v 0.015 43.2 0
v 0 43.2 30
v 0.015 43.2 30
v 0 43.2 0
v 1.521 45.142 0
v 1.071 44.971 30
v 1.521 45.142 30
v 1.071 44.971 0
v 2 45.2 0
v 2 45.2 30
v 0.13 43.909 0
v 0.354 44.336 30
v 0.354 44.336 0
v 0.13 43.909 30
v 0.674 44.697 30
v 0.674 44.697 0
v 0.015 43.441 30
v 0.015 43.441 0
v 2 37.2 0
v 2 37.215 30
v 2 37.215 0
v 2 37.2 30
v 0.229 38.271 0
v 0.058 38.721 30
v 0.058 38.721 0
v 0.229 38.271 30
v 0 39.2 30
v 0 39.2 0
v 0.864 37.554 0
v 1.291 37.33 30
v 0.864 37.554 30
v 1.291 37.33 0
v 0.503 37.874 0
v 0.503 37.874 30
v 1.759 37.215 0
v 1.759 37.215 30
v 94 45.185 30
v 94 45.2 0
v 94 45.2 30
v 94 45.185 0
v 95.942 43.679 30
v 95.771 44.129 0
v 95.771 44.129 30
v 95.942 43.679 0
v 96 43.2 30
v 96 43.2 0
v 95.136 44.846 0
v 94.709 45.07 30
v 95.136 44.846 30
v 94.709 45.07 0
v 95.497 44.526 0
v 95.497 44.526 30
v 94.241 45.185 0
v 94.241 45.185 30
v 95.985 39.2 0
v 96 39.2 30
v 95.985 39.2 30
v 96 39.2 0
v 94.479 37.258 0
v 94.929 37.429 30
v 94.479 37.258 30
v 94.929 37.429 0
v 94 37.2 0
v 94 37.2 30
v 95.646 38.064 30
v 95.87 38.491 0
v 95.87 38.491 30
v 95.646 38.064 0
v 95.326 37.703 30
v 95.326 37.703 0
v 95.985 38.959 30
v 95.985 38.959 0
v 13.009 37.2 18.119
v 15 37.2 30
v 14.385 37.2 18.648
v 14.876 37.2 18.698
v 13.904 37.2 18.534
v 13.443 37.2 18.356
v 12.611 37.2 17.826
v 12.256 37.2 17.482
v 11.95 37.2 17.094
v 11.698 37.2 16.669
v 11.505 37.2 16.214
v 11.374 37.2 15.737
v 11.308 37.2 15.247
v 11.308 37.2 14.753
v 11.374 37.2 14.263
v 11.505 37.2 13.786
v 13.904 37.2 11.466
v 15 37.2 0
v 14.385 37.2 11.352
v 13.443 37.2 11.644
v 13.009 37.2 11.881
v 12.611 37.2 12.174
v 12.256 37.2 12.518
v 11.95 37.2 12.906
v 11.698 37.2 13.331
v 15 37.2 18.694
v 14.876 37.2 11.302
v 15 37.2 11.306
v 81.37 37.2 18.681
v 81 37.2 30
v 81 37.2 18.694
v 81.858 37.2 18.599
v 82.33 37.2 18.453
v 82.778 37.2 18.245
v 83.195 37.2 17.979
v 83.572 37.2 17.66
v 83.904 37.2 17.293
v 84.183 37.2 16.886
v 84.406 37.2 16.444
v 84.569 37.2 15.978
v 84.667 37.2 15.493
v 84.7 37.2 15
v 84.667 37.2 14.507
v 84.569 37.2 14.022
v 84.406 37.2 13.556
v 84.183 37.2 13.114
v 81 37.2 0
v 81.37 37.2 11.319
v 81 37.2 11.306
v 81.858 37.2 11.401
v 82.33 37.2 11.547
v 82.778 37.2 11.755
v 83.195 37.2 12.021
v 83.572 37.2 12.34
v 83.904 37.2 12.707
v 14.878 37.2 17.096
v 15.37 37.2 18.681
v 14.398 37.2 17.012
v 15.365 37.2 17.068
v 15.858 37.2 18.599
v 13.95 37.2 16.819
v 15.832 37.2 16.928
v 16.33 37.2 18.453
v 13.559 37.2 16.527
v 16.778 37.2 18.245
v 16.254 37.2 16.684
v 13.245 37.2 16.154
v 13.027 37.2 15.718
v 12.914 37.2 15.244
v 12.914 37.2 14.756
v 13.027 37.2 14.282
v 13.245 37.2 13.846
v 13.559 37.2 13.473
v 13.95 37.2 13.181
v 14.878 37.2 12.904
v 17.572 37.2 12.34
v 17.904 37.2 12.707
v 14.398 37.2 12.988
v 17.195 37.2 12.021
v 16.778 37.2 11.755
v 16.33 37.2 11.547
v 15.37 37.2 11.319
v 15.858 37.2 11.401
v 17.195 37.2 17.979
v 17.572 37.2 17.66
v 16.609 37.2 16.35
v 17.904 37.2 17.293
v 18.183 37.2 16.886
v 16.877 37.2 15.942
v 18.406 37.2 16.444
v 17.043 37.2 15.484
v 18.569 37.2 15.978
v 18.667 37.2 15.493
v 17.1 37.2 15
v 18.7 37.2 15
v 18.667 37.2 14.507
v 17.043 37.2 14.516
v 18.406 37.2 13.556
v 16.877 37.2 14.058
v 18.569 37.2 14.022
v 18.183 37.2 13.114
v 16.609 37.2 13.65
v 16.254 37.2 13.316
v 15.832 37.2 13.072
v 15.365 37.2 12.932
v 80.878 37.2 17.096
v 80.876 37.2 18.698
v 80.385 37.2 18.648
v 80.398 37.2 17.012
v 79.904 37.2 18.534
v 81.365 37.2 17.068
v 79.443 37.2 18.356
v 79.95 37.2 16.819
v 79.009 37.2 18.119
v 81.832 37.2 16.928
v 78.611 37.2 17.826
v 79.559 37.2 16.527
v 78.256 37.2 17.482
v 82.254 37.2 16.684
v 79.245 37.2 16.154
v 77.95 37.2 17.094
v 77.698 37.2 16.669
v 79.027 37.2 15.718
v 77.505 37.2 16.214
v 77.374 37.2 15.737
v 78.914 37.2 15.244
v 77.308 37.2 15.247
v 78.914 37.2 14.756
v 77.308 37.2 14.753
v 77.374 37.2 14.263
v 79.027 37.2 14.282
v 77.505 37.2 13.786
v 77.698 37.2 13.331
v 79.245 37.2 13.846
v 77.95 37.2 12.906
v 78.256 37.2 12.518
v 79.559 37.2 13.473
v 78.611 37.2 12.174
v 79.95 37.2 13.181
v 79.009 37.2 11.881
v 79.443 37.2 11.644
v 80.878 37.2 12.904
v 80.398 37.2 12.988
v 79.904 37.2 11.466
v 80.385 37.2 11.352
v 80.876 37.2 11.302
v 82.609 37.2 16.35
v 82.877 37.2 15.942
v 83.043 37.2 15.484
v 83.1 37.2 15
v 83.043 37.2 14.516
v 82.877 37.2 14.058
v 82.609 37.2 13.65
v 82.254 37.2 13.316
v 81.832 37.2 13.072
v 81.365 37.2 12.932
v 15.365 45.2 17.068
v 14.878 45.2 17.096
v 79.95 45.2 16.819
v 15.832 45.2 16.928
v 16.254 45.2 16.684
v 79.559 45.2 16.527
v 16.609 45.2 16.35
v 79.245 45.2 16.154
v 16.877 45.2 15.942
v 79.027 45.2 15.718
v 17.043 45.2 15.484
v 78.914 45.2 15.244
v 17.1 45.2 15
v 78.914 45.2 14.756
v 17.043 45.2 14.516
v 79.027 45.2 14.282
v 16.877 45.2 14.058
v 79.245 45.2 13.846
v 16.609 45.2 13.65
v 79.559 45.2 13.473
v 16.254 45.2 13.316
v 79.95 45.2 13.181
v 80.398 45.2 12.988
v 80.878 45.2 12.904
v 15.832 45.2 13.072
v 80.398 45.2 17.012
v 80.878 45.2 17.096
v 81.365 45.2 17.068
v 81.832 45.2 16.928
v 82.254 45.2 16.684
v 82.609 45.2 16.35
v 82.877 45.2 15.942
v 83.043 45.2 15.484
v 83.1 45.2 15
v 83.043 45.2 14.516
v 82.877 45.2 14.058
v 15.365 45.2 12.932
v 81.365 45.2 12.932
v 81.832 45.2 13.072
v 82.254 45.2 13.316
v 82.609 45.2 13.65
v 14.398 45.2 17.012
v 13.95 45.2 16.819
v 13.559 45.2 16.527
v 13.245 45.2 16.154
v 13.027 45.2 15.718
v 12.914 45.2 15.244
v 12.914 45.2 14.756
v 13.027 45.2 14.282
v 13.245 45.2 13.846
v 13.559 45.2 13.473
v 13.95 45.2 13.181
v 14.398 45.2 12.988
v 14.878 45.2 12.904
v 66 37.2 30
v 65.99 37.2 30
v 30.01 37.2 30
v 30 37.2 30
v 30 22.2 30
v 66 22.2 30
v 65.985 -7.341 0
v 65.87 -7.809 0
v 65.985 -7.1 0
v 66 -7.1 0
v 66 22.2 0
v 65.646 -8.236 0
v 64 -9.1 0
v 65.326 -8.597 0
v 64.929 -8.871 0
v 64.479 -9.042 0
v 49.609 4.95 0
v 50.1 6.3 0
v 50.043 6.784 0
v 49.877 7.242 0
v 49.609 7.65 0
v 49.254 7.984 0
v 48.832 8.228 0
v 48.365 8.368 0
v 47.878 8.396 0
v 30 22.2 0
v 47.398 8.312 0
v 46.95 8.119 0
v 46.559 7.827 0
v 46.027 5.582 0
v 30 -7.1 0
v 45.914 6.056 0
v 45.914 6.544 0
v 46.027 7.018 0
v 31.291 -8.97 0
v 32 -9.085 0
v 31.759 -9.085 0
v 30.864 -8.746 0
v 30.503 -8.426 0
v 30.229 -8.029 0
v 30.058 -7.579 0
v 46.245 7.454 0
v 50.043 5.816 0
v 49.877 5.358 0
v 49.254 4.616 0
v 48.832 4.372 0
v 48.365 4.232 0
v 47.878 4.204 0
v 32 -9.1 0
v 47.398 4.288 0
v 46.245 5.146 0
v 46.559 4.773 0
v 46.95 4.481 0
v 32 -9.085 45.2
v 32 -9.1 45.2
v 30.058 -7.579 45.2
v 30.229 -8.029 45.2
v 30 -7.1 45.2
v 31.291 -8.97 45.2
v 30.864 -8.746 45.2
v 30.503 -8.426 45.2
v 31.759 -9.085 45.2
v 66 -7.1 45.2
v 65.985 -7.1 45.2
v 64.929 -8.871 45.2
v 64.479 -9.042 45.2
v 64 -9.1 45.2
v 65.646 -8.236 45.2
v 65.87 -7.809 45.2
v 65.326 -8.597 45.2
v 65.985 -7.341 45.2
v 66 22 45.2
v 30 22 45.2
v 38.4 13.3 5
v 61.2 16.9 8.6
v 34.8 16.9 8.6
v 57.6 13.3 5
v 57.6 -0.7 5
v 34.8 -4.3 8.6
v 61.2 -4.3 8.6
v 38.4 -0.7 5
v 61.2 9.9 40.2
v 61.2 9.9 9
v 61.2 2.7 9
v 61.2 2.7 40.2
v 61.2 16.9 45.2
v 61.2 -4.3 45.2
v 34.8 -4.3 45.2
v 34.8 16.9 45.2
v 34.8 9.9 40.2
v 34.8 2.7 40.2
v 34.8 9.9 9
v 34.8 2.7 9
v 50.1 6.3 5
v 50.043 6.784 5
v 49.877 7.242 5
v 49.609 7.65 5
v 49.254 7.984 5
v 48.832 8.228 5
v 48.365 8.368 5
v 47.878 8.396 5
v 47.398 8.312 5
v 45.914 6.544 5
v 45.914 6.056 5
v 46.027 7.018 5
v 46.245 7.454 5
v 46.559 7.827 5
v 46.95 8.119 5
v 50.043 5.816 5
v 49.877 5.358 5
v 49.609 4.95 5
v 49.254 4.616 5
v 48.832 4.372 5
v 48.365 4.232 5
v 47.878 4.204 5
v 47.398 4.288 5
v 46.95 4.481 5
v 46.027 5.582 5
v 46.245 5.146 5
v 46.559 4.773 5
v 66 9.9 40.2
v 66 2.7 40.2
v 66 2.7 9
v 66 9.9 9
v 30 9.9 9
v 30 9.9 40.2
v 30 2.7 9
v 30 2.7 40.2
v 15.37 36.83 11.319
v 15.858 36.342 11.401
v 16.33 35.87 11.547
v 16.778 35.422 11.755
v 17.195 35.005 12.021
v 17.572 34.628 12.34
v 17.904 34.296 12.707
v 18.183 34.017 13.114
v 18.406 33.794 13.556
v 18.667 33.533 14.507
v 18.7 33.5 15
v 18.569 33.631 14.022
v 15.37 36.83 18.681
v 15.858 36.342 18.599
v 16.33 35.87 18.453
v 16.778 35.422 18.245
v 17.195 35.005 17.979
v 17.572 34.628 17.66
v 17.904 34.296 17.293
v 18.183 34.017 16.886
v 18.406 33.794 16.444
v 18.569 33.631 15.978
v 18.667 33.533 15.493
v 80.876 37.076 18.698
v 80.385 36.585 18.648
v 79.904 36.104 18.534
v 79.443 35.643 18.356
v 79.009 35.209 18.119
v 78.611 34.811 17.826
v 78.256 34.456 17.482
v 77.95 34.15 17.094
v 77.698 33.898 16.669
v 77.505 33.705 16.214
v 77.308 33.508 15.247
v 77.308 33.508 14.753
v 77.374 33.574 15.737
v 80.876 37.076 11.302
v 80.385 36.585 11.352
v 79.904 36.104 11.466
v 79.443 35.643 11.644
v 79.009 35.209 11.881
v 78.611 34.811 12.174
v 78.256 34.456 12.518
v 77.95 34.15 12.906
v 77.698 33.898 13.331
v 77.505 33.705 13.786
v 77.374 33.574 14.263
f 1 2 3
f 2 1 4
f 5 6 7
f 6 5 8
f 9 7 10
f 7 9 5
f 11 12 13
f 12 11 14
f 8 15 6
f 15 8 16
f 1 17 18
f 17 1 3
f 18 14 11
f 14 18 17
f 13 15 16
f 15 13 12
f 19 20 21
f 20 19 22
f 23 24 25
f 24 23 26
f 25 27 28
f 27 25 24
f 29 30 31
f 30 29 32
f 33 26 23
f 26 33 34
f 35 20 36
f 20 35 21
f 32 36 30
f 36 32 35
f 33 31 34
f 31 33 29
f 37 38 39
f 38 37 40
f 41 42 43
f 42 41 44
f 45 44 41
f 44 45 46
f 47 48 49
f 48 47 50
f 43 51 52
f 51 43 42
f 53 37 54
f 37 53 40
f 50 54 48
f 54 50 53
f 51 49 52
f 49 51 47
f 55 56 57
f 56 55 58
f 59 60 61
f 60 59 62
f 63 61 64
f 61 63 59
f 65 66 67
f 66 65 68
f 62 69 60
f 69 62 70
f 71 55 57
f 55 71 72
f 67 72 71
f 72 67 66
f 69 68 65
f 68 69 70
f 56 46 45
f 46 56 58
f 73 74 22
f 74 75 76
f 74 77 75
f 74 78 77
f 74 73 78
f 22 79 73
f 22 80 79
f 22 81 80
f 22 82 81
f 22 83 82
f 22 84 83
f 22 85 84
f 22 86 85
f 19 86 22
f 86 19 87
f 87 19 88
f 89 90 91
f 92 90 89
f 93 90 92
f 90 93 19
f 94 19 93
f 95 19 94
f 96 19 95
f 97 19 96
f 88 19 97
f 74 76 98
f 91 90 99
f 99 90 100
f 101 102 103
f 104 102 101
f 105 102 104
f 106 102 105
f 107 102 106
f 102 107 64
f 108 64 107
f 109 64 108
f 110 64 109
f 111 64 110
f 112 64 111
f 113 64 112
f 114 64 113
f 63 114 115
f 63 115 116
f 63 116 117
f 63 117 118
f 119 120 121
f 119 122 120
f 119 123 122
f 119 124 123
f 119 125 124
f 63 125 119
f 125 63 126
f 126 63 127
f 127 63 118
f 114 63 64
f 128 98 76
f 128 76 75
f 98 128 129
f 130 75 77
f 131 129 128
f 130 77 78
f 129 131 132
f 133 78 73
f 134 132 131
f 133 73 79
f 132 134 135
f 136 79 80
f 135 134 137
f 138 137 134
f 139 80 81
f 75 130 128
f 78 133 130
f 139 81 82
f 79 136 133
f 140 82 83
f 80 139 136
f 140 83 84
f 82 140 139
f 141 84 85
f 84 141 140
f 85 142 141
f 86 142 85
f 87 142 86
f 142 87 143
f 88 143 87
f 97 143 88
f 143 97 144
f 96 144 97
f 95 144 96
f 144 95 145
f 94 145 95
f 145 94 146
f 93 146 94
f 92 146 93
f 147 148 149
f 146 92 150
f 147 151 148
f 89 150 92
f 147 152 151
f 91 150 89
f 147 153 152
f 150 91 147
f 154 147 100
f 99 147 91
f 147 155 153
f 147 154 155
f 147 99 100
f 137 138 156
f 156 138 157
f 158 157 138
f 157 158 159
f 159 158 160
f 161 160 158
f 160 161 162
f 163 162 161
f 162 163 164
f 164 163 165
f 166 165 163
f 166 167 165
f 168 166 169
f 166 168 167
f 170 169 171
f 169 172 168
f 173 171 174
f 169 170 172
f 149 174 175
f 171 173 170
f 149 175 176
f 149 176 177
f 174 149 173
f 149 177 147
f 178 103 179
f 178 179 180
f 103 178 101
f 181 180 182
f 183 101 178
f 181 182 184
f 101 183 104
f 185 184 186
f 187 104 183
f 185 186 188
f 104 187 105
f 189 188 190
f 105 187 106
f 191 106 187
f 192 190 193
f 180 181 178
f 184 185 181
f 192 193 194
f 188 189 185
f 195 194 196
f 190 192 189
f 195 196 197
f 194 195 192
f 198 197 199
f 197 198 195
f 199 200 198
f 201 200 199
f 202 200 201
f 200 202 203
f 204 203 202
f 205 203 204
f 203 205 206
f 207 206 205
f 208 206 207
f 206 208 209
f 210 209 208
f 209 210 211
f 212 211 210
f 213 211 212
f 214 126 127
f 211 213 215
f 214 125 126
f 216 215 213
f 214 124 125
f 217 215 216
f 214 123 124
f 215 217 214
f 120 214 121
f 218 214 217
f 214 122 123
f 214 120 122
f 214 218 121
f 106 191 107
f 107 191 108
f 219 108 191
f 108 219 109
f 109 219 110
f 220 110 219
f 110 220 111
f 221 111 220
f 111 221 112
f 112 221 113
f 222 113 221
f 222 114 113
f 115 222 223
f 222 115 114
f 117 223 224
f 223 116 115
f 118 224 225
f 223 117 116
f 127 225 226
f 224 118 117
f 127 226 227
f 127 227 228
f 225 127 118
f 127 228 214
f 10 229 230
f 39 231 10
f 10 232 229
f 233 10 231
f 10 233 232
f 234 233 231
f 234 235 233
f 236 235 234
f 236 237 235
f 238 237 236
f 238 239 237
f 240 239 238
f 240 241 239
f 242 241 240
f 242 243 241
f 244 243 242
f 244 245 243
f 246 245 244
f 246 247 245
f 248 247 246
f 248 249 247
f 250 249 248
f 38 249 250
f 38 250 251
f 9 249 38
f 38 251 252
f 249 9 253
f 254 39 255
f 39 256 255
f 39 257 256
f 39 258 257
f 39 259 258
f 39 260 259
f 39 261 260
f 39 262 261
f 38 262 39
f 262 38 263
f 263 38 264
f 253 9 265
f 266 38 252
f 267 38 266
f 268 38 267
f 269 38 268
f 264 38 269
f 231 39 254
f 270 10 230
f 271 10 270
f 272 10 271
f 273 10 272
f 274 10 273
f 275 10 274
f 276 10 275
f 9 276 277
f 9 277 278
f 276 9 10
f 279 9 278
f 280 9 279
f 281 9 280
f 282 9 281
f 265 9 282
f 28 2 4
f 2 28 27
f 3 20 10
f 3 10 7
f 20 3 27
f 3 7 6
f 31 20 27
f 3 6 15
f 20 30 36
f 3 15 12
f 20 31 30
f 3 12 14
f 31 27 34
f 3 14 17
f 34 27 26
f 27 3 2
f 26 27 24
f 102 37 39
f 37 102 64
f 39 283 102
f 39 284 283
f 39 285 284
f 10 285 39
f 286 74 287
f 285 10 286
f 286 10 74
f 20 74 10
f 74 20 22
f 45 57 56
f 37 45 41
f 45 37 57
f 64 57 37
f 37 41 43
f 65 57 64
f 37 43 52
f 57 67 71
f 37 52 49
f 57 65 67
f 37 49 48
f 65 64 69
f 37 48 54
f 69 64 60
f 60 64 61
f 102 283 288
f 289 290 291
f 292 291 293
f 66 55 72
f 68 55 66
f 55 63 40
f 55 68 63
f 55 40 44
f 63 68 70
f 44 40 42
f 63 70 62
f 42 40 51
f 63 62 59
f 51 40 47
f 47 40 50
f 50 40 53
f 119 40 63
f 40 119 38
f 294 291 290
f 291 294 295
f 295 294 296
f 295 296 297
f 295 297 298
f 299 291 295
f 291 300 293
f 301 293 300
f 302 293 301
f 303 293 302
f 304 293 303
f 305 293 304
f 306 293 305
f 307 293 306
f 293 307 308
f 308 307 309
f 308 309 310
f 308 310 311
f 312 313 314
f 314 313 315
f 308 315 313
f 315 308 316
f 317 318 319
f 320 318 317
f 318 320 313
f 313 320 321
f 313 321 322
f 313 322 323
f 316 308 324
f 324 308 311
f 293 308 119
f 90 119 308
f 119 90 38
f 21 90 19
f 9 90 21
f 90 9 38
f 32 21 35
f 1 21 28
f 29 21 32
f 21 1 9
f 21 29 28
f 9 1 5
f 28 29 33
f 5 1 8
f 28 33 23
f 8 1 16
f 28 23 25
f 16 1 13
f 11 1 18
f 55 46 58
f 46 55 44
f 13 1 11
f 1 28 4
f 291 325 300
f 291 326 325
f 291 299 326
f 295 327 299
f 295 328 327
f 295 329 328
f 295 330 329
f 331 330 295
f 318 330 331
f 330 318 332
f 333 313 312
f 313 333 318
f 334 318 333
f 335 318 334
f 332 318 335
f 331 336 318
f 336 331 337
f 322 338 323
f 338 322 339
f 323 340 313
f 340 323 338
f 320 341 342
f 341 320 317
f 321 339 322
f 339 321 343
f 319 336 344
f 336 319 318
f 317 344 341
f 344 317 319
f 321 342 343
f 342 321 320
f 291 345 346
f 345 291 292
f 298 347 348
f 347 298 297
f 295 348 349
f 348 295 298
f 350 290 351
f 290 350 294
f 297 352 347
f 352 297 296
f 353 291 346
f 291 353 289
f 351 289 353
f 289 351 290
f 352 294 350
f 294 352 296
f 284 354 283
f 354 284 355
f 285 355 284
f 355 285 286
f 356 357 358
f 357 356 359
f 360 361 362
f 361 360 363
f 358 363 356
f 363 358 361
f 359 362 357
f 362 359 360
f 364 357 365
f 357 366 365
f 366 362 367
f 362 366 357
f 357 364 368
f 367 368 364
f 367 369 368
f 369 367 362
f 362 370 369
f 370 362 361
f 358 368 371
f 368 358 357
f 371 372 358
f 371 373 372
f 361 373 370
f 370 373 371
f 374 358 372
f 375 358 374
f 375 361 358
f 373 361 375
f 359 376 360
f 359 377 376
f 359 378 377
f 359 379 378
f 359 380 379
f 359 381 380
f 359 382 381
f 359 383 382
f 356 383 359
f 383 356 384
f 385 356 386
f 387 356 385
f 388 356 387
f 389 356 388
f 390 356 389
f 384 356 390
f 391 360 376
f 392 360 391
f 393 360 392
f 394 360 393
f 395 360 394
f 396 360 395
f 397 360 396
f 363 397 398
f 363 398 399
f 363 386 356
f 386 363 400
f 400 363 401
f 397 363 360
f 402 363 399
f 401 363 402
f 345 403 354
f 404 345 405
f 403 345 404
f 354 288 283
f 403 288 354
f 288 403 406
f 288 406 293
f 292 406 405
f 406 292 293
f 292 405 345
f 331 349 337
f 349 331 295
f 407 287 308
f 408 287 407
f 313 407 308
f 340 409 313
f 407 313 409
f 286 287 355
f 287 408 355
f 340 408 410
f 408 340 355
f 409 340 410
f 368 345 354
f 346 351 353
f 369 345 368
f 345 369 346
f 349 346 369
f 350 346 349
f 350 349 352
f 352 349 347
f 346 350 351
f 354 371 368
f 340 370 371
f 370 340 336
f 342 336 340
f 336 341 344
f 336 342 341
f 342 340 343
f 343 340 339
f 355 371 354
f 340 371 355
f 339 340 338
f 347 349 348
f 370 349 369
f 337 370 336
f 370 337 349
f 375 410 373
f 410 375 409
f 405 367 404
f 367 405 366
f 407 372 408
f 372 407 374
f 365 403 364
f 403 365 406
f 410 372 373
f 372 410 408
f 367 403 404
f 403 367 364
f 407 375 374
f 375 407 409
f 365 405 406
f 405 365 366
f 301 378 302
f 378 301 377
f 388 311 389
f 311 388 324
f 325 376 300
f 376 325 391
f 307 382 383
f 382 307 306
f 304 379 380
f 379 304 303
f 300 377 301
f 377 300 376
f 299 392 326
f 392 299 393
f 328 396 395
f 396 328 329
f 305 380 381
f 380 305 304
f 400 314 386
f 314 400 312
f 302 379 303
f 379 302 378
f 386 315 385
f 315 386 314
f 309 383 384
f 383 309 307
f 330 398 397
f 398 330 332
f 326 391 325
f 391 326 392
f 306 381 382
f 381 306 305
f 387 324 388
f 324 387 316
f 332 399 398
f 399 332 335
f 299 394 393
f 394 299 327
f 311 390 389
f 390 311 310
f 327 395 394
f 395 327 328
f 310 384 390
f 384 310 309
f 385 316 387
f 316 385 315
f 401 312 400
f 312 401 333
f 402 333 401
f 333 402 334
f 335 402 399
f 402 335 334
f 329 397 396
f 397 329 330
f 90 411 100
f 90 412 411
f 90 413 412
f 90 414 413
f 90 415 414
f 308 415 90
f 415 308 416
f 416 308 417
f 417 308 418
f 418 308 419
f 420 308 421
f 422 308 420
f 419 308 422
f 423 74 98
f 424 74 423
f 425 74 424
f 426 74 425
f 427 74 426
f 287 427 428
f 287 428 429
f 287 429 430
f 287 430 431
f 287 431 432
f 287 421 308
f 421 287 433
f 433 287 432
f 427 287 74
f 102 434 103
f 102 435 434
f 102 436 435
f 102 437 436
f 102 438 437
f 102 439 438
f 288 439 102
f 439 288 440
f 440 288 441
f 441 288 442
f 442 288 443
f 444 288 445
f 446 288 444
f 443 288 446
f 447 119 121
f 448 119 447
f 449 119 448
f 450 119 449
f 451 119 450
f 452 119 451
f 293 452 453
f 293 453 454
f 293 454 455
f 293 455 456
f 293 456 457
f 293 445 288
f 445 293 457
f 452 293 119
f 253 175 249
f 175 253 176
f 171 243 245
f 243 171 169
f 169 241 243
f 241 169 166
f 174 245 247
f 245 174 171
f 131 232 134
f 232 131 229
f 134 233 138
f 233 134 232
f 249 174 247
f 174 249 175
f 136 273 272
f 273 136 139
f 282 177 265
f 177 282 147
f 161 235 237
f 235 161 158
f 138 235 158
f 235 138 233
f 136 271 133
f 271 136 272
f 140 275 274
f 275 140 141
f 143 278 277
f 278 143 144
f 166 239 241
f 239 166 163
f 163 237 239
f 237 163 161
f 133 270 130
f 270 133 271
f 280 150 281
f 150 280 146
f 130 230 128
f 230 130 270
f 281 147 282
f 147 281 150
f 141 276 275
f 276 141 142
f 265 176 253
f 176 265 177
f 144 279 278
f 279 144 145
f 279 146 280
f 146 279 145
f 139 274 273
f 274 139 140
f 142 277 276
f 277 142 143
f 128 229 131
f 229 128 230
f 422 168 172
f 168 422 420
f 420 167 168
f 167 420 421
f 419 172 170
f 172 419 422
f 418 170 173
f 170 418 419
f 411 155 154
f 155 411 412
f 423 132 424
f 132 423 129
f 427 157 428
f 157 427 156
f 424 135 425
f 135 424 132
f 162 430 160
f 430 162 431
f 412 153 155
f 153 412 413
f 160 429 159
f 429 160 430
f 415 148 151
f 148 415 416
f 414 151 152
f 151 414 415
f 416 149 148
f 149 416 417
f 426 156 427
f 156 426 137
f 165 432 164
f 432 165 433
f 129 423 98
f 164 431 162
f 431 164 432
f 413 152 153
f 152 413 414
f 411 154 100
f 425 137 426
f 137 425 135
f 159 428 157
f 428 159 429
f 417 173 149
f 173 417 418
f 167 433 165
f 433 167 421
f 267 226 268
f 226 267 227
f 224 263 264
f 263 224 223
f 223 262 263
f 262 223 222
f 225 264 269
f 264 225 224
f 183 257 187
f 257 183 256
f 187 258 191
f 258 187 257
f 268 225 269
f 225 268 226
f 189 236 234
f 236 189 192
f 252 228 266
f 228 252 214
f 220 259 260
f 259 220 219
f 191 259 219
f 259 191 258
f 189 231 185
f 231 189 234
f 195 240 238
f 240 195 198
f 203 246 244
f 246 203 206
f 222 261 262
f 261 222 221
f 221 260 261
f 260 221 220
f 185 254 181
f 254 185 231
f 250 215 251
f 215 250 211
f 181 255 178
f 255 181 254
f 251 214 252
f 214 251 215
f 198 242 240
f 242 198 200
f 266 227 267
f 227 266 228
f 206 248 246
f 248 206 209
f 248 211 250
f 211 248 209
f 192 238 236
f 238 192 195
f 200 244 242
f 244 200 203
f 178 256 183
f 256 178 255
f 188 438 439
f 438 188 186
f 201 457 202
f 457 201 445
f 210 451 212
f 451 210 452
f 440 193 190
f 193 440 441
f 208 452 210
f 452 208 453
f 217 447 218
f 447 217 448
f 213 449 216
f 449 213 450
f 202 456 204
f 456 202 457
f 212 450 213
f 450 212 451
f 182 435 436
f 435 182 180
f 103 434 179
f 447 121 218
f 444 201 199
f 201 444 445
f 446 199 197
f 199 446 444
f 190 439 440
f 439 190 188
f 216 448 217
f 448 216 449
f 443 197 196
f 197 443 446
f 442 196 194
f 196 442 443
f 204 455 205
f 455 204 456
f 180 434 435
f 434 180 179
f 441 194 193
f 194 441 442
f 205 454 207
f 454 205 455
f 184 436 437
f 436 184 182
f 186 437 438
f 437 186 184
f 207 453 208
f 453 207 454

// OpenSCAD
// file: idler_cte.scad
include <oscad_utils/bolt_sizes.scad> // include to use the constants
use <oscad_utils/bolts.scad>  


// Height of the idler pulley group:
// - washer M6 DIN-9021
// - washer M4 DIN-125
// - bearing 624ZZ
// - washer M4 DIN-125
// - washer M6 DIN-9021
idler_h     = 10.8;  // no need for tolerance
//radius of the idler pulley 6mm DIN 9021 washer, the wider ones)
idler_r     = m6_wash9021_or + 2;  // or: outer radius
idler_r_xtr = idler_r + 2;  // +2: a little bit larger

// Thickness of the sides that holds the idler pulley
wall_thick = 5;


//  Length of the body, the stroke. Not including the pulley
tens_stroke = 20;

// distance between the pulley and the stroke
pulley_stroke_dist = wall_thick;

// plastic space above and bellow the nut for the screw
nut_holder_thick = 4;
// the space for the nut height, will be get multipliying this multiplier by
// the nut height 
nut_space_h_mult = 2;
nut_space = nut_space_h_mult * m4_nut_h_tol;
nut_holder_total = nut_space + 2*nut_holder_thick;

// inner fillet:
in_fillet = 2;

tens_h = idler_h + 2*wall_thick;
// old tensioner y
tens_l = (   nut_holder_total
          + tens_stroke
          + 2 * idler_r_xtr
          + pulley_stroke_dist) ;
tens_w = 2 * idler_r_xtr; 

tens_w_tol = tens_w + tol;
tens_h_tol = tens_h + tol;


// the shank for the idler pulley, 
boltidler_r_tol = m4_r_tol;
// the screw for tensioning the pulley 
bolttens_r_tol = m4_r_tol;

//aluprof_bolt_head_r_tol = m3_head_r_tol;
//aluprof_bolt_r_tol = m3_r_tol;
//aluprof_bolt_head_l = m3_head_l;
// bolt size to attach the piece to the aluminum profile
aluprof_bolt_d = 4;

// cannot do it with if due to the variable scope
aluprof_bolt_head_r_tol = (aluprof_bolt_d == 6) ?
                            m6_head_r_tol :
                          ((aluprof_bolt_d == 5) ?
                            m5_head_r_tol :
                          ((aluprof_bolt_d == 4) ?
                            m4_head_r_tol : m3_head_r_tol ));

// cannot do it with if due to the variable scope
aluprof_bolt_r_tol = (aluprof_bolt_d == 6) ?
                            m6_r_tol :
                          ((aluprof_bolt_d == 5) ?
                            m5_r_tol :
                          ((aluprof_bolt_d == 4) ?
                            m4_r_tol : m3_r_tol ));

// cannot do it with if due to the variable scope
aluprof_bolt_head_l = (aluprof_bolt_d == 6) ?
                            m6_head_l :
                          ((aluprof_bolt_d == 5) ?
                            m5_head_l :
                          ((aluprof_bolt_d == 4) ?
                            m4_head_l : m3_head_l ));

/* this is useless in openscad because of the variable scope
   the variables are not updated after the conditions
if (aluprof_bolt_d == 6) {
  aluprof_bolt_head_r_tol = m6_head_r_tol;
  aluprof_bolt_r_tol = m6_r_tol;
  aluprof_bolt_head_l = m6_head_l;
} else {
  if (aluprof_bolt_d == 5) {
    aluprof_bolt_head_r_tol = m5_head_r_tol;
    aluprof_bolt_r_tol = m5_r_tol;
    aluprof_bolt_head_l = m5_head_l;
    echo(aluprof_bolt_r_tol);
  } else {
    if (aluprof_bolt_d == 4) {
      aluprof_bolt_head_r_tol = m4_head_r_tol;
      aluprof_bolt_r_tol = m4_r_tol;
      aluprof_bolt_head_l = m4_head_l;
    } else {
      aluprof_bolt_head_r_tol = m3_head_r_tol;
      aluprof_bolt_r_tol = m3_r_tol;
      aluprof_bolt_head_l = m3_head_l;
    }
  }
}
*/


// We are using 30x30 profiles
aluprof_w = 30;

// The position where the GT2 starts, from the lower profile
// Considering that the filter holder and guide are in a higher
// aluminum profile than the filter_idler

gt2_pos_h = aluprof_w + 3.5;

tens_pos_h = gt2_pos_h - wall_thick;

// The part of the tensioner that will be inside
tens_l_inside = tens_l - 2 * idler_r_xtr;

// the height to the beggining of the pulley + pulley height +
//  

hold_w = tens_w + 2*wall_thick;
hold_l = tens_l_inside + wall_thick;
hold_h = tens_pos_h + tens_h + wall_thick;

hold_bas_w = hold_w + 2*aluprof_w;
hold_bas_l = aluprof_w;
hold_bas_h = 8;

// optional tensioner chamfer, see step 04b in idler_tensioner.scad
opt_tens_chmf = 1;
// if you want to have the hole at the idler_holder to see inside, on one
// side, or both sides:
hold_hole_2sides = 1;
// file: oscad_utils/bolts.scad
/*
 *    OpenScad functions to make bolt holes
 *
 *    Copyright (C) 2016 Felipe Machado
 *    Universidad Rey Juan Carlos, Spain
 *    https://github.com/felipe-m
 *    License: LGPL 3.0 or later
 *
 *    to use this functions include in your file:
 * use <bolts.scad>
 *    if not in the same directory:
 * use <PATH_TO/bolts.scad>
 *    dont use 'include' instead of 'use' so you dont get the objects
 *    created in this file
*/


include <bolt_sizes.scad>

// the hole for the bolt shank and the nut
// Tolerances have to be included
// r_shank: Radius of the shank (tolerance included)
// l_bolt: total length of the bolt: head & shank
// r_head: radius of the head (tolerance included)
// l_head: length of the head
// hex_head: inidicates if the head is hexagonal or rounded
//            1: hexagonal
//            0: rounded
// h_layer3d: height of the layer for printing, if 0, means that the support
//            is not needed
// mnfold: 1 if you want 1 mm on top and botton to avoid non-manifold
//             pieces after makeing differences


module bolt_hole (r_shank, l_bolt, r_head, l_head, hex_head, h_layer3d, mnfold)
{
  union () {
    // we make it all the way, although it is not necessary because
    // on the lower part it will be also the nut 
    // if mnfold == 1 it will make the translations and make the piece 
    // larger
    translate([0,0,-mnfold])
      cylinder (r= r_shank, h= l_bolt+2*mnfold, $fa=1, $fs=0.5);
   if (hex_head == 0) {
      translate([0,0,-mnfold])
        cylinder (r= r_head, h= l_head+mnfold, $fa=1, $fs=0.5);  
   } else {
      translate([0,0,-mnfold])
      cylinder (r= r_head, h= l_head+mnfold, $fn=6);  
   }
    
  // This is a triangle that it is barely supported by the bolt head
  // and it will support the circle above 
  // In a regular triangle the apotheme (in radius) is twice
  // the circumradius (r)
  // Intersection with the hexagon to take the vertexs away, because
  // they are outside the hexagon
  if ( h_layer3d > 0) { // we don't do this if h_layer3d == 0
    intersection () {  
      rotate([0,0,30])translate([0,0,l_head])
        cylinder (r= r_shank*2, h=h_layer3d, $fn=3);
      // take vetexs away:
      if (hex_head == 0) {
        translate([0,0,l_head])
          cylinder (r= r_head, h= h_layer3d, $fa=1, $fs=0.5);       
      } else {
        translate([0,0,l_head])
          cylinder (r= r_head, h= h_layer3d, $fn=6);           
      }
    }
        // 1.15 is the relationship between the Radius and the Apothem
    // of the hexagon: sqrt(3)/2 . I make it slightly smaller
    translate([0,0,l_head+h_layer3d])
      //rotate ([0,0,30])
      cylinder (r=r_shank*1.15, h=h_layer3d, $fn=6);  
  
  }
 
 }  
  
}



bolt_hole (r_shank= m4_r_tol, l_bolt=10, r_head=m4_head_r_tol, l_head=m4_head_l, h_layer3d);


bolt_hole (r_shank = m4_r_tol, l_bolt=10, r_head=m4_head_r_tol, l_head=m4_head_l, hex_head=1, h_layer3d=h_layer3d, mnfold=1);

translate ([10,0,0])
#bolt_hole (r_shank = m4_r_tol, l_bolt=10, r_head=m4_head_r_tol, l_head=m4_head_l, hex_head=0, h_layer3d=h_layer3d, mnfold=0);
// file: oscad_utils/bolt_sizes.scad
/*
 *    OpenScad constants for bolt
 *
 *    Copyright (C) 2016 Felipe Machado
 *    Universidad Rey Juan Carlos, Spain
 *    https://github.com/felipe-m
 *    License: LGPL 3.0 or later
 *
 *    to use this functions include in your file:
 * include <bolts.scad>
 *    if not in the same directory:
 * include <PATH_TO/bolts.scad>
*/


// Tolerance
tol =  0.4;
// Tolerance for small objects
stol = 0.2;

h_layer3d = 0.3;
$fa=1;
$fs=0.5;

// Nuts and bolt sizes
m3_r = 1.5;  
m4_r = 2;    
m5_r = 2.5;  

// Tolerances stol/2 because is the radius
m3_r_tol = m3_r + stol/2;  // M3 diameter 3.2 mm for the tolerance
m4_r_tol = m4_r + stol/2;  // M4 diameter 4.2 mm for the tolerance
m5_r_tol = m5_r + (tol + stol)/4;  // M5 diameter 5.3 mm for the tolerance
//echo ("m3_r_tol", m3_r_tol);
//echo ("m4_r_tol", m4_r_tol);

// -------------- Head sizes DIN-912 bolts
// Head radius DIN-912 bolts
m3_head_r  = 5.5/2;
m4_head_r  = 7/2;
m5_head_r  = 8.5/2;
m6_head_r  = 10/2;
m8_head_r  = 13/2;
m10_head_r = 16/2;

// Head radius DIN-912 bolts with tolerances. 
// divided by 2 because is the radius
m3_head_r_tol  = m3_head_r  + tol/2;
m4_head_r_tol  = m4_head_r  + tol/2;
m5_head_r_tol  = m5_head_r  + tol/2;
m6_head_r_tol  = m6_head_r  + tol/2;
m8_head_r_tol  = m8_head_r  + tol/2;
m10_head_r_tol = m10_head_r + tol/2;

// Head length DIN-912 bolts
m3_head_l = 3;
m4_head_l = 4;
m5_head_l = 4;
m6_head_l = 6;
m8_head_l = 8;

// M3 nut
m3_nut_r = 6.01/2;  // DIN934 M3 nut circumradius
m3_nut_h = 2.4;     // DIN934 M3 nut height

//less tolerance for small numbers. 0.2 (diameter)
m3_nut_r_tol = m3_nut_r + stol/2;  //radius: diam/2
m3_nut_h_tol = m3_nut_h + tol;

// M4 nut
m4_nut_r = 7.66/2;  // DIN934 M4 nut circumradius
m4_nut_h = 3.2;     // DIN934 M4 nut height
m4_nut_ap = 7/2;    // DIN934 M4 nut apotheme

//less tolerance for small numbers. 0.2 (diameter)
m4_nut_r_tol  = m4_nut_r + stol/2;  //radius: diam/2
m4_nut_h_tol  = m4_nut_h + tol;
m4_nut_ap_tol = m4_nut_ap + stol/2; 

// -------------------- DIN 9021 Washers ----------------
// outer radius (or)
m6_wash9021_or = 18 / 2;
// height
m6_wash9021_h = 1.6;
// main file
/* Idler holder
  ----------------------------------------------------------------------------
  -- (c) Felipe Machado
  -- Area of Electronic Technology. Rey Juan Carlos University (urjc.es)
  -- https://github.com/felipe-m
  -- December-2017
  ----------------------------------------------------------------------------
  --- LGPL Licence
  ----------------------------------------------------------------------------


                   
                    ________   
                   /______ /|  
                  |  ___  | |     Z               
                  | |   | |/\     :
                  | |___| |\ \    :
              ____|_______| \ \___:
      X....../___/ \       \ \/__/| 
             |______\_______\____|/
                                 .
                                .
                               .
                              Y
                                              Z      Z
                                              :      :
                               _______        :      :______________
                              |  ___  |       :      |  __________  |
                              | |   | |       :      | |__________| |
                             /| |___| |\      :      |________      |
                            / |_______| \     :      |        |    /      
                    .. ____/  |       |  \____:      |________|  /
        hold_bas_h.+..|_::____|_______|____::_|      |___::___|/......Y
 
                       .... hold_bas_w ........
                      :        .hold_w.        :
                      :       :    wall_thick  :
                      :       :      +         :
                      :       :     : :        :
               X......:_______:_____:_:________:....
                      |    |  | :   : |  |     |    :
                      |  O |  | :   : |  |  O  |    + hold_bas_l
                      |____|__| :   : |__|_____|....:
                              | :   : |        :
                              |_:___:_|        :
                                               :
                                               :
                                               :
                                               Y



                   ___:___          
                  |  ___  |         
                  | | 1 | |         
                 /| |___| |\       
                / |_______| \      
           ____/  |       |  \____ ...
          |_::____|___2___|____::_|..: holder_base_z


*/




include <oscad_utils/bolt_sizes.scad> // include to use the constants
use <oscad_utils/fillet.scad>
use <oscad_utils/bolts.scad>  
// where the constants are defined
include <idler_cte.scad>

module idler_holder()
{
  difference () {
    union () 
    {
      difference () {
      /* --------------- step 01 --------------------------- 
         the base, to attach it to the aluminum profiles
         

                                                Z      Z
                                                :      :
                      .. _______________________:      :________
          hold_bas_h.+..|_______________________|      |________|......Y
 
                         .... hold_bas_w ........
                        :                        :
                 X......:________________________:....
                        |                        |    :
                        |                        |    + hold_bas_l
                        |________________________|....:
                                                 :
                                                 Y
        */

        cube([hold_bas_w, hold_bas_l, hold_bas_h]);

      /* --------------- step 02 --------------------------- 
         Fillet the base
         The piece will be printed on the XZ plane, so this fillet will be 
         raising
       

                                              Z
                                              :
                     f4_______________________f2
               X......(_______________________)
                     f3                        f1
        */
        // fillet f1
        fillet_dif_y (r=in_fillet, h = hold_bas_l, xdir=-1, zdir=-1, fillet=1);
        // fillet f2
        translate ([0,0, hold_bas_h])
          fillet_dif_y (r=in_fillet, h = hold_bas_l, xdir=-1, zdir=1, fillet=1);
        // fillet f3
        translate ([hold_bas_w,0, 0])
          fillet_dif_y (r=in_fillet, h = hold_bas_l, xdir=1, zdir=-1, fillet=1);
        // fillet f4
        translate ([hold_bas_w,0, hold_bas_h])
          fillet_dif_y (r=in_fillet, h = hold_bas_l, xdir=1, zdir=1, fillet=1);
      } //end of difference

      // union: element 2
      translate ([aluprof_w,0,0])
      {
        difference () {
      /* --------------- step 03 --------------------------- 
         The main box
                                  aluprof_w   Z      Z
                                       ..+....:      :
                .............. _______:       :      :____________
                :             |       |       :      |            |
                :             |       |       :      |            |
        hold_h +:             |       |       :      |            |
                :             |       |       :      |            |     
                :      _______|       |_______:      |________    |
            X...:.....(_______|_______|_______)      |________|___|...Y
                                                     :            :
                       .... hold_bas_w ........      :.. hold_l...:
                      :                        :
                      :        .hold_w.        :
                      :       :       :        :
               X......:_______:_______:________:....
                      |       |       |        |    :
                      |       |       |        |    + hold_bas_l
                      |_______|       |________|....:
                              |       |        :
                              |_______|        :
                                               :
                                               :
                                               Y

      */
          cube([hold_w, hold_l, hold_h]);

      /* --------------- step 04 --------------------------- 
         Fillets on top
                                  aluprof_w   Z
                                       ..+....:
                .............f2_______f1      : 
                :             /       \       :
                :             |       |       :
        hold_h +:             |       |       :
                :             |       |       :
                :      _______|       |_______:
            X...:.....(_______|_______|_______)
      */

          // Fillet f1
          translate ([0,0, hold_h])
            fillet_dif_y (r=in_fillet, h=hold_l, xdir=-1,zdir=1,fillet=1);
          // Fillet f2
          translate ([hold_w,0, hold_h])
            fillet_dif_y (r=in_fillet, h=hold_l, xdir=1,zdir=1,fillet=1);

      /* --------------- step 05 --------------------------- 
         large chamfer at the bottom

                                              Z      Z
                                              :      :
        Option A               _______        :      :____________
                              /       \       :      |            |
                              |       |       :      |            |
                              |_______|       :      |            |
                              |       |       :      |           /       
                       _______|_______|_______:      |________ /  
            X.........(_______________________)      |________|.......Y
                                                     :            :

        
                                              Z      Z
                                              :      :
        Option B               _______        :      :____________
                              /       \       :      |            |
                              |       |       :      |            |
                              |       |       :      |            |
                              |_______|       :      |            |      
                       _______|       |_______:      |________   /  
            X.........(_______|_______|_______)      |________|/......Y
                                                     :            :
                                                                    
       */

          // option B: using more material (probably sturdier)
          //chmf_rad = min(hold_l - hold_bas_l,
          //               hold_h - (tens_h+2*wall_thick));
          // option A: using less material
          chmf_rad = min(hold_l-hold_bas_l+ hold_bas_h,
                         hold_h + hold_bas_h - (tens_h+2*wall_thick));
          translate ([0, hold_l,0])
            fillet_dif_x (r=chmf_rad, h= hold_w,
                          ydir=1, zdir=-1, fillet=0);

      /* --------------- step 06 --------------------------- 
         Hole for the tensioner
                                              Z      Z
                                              :      :
                               _______        :      :____________
                              /  ___  \       :      |c2..........|
                              | |   | |       :      | :          |
                              | |___| |       :      |c1..........|
                              |_______|       :      |            |      
                       _______|       |_______:      |________   /  
            X.........(_______|_______|_______)      |________|/......Y

      */

          translate ([wall_thick-tol/2, hold_l-tens_l_inside,tens_pos_h-tol/2])
          {
            difference () 
            {
              cube([tens_w_tol, tens_l_inside+1, tens_h_tol]);
              // chamfers on the nut corner. Chamfer c1
              fillet_dif_x (r=2*in_fillet-tol, h=tens_w_tol,
                            ydir=-1, zdir=-1, fillet=0);   
              // chamfer c2
              translate([0,0,tens_h_tol])
                fillet_dif_x (r=2*in_fillet-tol, h=tens_w_tol,
                              ydir=-1, zdir=1, fillet=0); 
              // Optional chamfers, only if they have been done in the tensioner
              if (opt_tens_chmf == 1) { // optional tensioner chamfer
                fillet_dif_z (r=2*in_fillet-tol, h=tens_h_tol,
                              xdir=-1, ydir=-1, fillet=0);   
                translate([tens_w_tol,0,0])
                  fillet_dif_z (r=2*in_fillet-tol, h=tens_h_tol,
                                xdir=1, ydir=-1, fillet=0); 
              }

            }
          } 

      /* --------------- step 07 --------------------------- 
         A hole to be able to see inside, could be on one side or both
                                              Z      Z
                                              :      :
                               _______        :      :____________
                              /. ___ .\       :      |  ._______ .|
                              |.|   |.|       :      | :|_______| |
                              | |___| |       :      |  ..........|
                              |_______|       :      |            |      
                       _______|       |_______:      |________   /  
            X.........(_______|_______|_______)      |________|/......Y

      */
          if (hold_hole_2sides == 1) {
            translate ([-1,
                        wall_thick + nut_holder_thick,
                        tens_pos_h +  tens_h /2 - m4_nut_ap_tol ])
              cube([hold_w+2,
                    hold_l - nut_holder_thick - 2* wall_thick,
                    2*m4_nut_ap_tol]);
          } else { // one side only
            translate ([hold_w-wall_thick-1,
                        wall_thick + nut_holder_thick,
                        tens_pos_h +  tens_h /2 - m4_nut_ap_tol ])
              cube([wall_thick+2,
                    hold_l - nut_holder_thick - 2* wall_thick,
                    2*m4_nut_ap_tol]);
          }
      /* --------------- step 08 --------------------------- 
         A hole for the leadscrew
                                              Z      Z
                                              :      :
                               _______        :      :____________
                              /. ___ .\       :      |  ._______ .|
                              |.| O |.|       :      |::|_______| |
                              | |___| |       :      |  ..........|
                              |_______|       :      |            |      
                       _______|       |_______:      |________   /  
            X.........(_______|_______|_______)      |________|/......Y

      */
          translate ([hold_w/2, -1, tens_pos_h + tens_h/2])
            rotate ([-90,0,0])
            cylinder (r=bolttens_r_tol, h=wall_thick+2, $fa=1, $fs=0.5); 
        }
      }

      /* --------------- step 09 --------------------------- 
         Chamfer the unions
                                   Z   Z
                                   :   :
                    _______        :   :____________
                   /. ___ .\       :   |  ._______ .|
                   |.| O |.|       :   |::|_______| |...
                  /| |___| |\      :   |  ..........|... tens_h/2 -m4_nut_ap_tol
                 / |_______| \     :   |            |  :+tens_pos_h
            ____/__|       |__\____:   |________   /   :  ...
        X..(_______|_______|_______)   |________|/.....:.....hold_bas_h
      */

      // union: element 3
      // this min is to avoid having the chamfer above the hole to see
      chmf_rad = min(aluprof_w/2,
                     tens_pos_h + tens_h/2 - m4_nut_ap_tol - hold_bas_h);
      translate ([aluprof_w, 0, hold_bas_h])
        fillet_add_y (r=chmf_rad, h=hold_bas_l, xdir=-1, zdir=1, fillet=0);
      translate ([hold_bas_w - aluprof_w, 0, hold_bas_h])
        fillet_add_y (r=chmf_rad, h=hold_bas_l, xdir=1, zdir=1,fillet=0);
  
    }
      /* --------------- step 10 --------------------------- 
         Bolt holes to attach the piece to the aluminum profile
                                   Z   Z
                                   :   :
                    _______        :   :____________
                   /. ___ .\       :   |  ._______ .|
                   |.| O |.|       :   |::|_______| |
                  /| |___| |\      :   |  ..........|
                 / |_______| \     :   |            |
            ____/__|       |__\____:   |________   /
        X..(__::___|_______|__::___)   |___::___|/
      */
    translate ([aluprof_w/2,
                aluprof_w/2,
                hold_bas_h + aluprof_bolt_head_l])
        rotate ([180,0,0])
          bolt_hole (r_shank = aluprof_bolt_r_tol,
                     l_bolt = hold_bas_h + aluprof_bolt_head_l,
                     r_head = aluprof_bolt_head_r_tol,
                     l_head = aluprof_bolt_head_l, hex_head = 0, 
                     h_layer3d = 0, mnfold = 1);

    translate ([hold_bas_w - aluprof_w/2,
                aluprof_w/2,
                hold_bas_h + aluprof_bolt_head_l])
        rotate ([180,0,0])
          bolt_hole (r_shank = aluprof_bolt_r_tol,
                     l_bolt = hold_bas_h + aluprof_bolt_head_l,
                     r_head = aluprof_bolt_head_r_tol,
                     l_head = aluprof_bolt_head_l, hex_head = 0, 
                     h_layer3d = 0, mnfold = 1);
  }
}




// Rotation and translation to print, axis are moved
translate ([0, hold_l,0])
  rotate ([90,0,0])
    idler_holder();
